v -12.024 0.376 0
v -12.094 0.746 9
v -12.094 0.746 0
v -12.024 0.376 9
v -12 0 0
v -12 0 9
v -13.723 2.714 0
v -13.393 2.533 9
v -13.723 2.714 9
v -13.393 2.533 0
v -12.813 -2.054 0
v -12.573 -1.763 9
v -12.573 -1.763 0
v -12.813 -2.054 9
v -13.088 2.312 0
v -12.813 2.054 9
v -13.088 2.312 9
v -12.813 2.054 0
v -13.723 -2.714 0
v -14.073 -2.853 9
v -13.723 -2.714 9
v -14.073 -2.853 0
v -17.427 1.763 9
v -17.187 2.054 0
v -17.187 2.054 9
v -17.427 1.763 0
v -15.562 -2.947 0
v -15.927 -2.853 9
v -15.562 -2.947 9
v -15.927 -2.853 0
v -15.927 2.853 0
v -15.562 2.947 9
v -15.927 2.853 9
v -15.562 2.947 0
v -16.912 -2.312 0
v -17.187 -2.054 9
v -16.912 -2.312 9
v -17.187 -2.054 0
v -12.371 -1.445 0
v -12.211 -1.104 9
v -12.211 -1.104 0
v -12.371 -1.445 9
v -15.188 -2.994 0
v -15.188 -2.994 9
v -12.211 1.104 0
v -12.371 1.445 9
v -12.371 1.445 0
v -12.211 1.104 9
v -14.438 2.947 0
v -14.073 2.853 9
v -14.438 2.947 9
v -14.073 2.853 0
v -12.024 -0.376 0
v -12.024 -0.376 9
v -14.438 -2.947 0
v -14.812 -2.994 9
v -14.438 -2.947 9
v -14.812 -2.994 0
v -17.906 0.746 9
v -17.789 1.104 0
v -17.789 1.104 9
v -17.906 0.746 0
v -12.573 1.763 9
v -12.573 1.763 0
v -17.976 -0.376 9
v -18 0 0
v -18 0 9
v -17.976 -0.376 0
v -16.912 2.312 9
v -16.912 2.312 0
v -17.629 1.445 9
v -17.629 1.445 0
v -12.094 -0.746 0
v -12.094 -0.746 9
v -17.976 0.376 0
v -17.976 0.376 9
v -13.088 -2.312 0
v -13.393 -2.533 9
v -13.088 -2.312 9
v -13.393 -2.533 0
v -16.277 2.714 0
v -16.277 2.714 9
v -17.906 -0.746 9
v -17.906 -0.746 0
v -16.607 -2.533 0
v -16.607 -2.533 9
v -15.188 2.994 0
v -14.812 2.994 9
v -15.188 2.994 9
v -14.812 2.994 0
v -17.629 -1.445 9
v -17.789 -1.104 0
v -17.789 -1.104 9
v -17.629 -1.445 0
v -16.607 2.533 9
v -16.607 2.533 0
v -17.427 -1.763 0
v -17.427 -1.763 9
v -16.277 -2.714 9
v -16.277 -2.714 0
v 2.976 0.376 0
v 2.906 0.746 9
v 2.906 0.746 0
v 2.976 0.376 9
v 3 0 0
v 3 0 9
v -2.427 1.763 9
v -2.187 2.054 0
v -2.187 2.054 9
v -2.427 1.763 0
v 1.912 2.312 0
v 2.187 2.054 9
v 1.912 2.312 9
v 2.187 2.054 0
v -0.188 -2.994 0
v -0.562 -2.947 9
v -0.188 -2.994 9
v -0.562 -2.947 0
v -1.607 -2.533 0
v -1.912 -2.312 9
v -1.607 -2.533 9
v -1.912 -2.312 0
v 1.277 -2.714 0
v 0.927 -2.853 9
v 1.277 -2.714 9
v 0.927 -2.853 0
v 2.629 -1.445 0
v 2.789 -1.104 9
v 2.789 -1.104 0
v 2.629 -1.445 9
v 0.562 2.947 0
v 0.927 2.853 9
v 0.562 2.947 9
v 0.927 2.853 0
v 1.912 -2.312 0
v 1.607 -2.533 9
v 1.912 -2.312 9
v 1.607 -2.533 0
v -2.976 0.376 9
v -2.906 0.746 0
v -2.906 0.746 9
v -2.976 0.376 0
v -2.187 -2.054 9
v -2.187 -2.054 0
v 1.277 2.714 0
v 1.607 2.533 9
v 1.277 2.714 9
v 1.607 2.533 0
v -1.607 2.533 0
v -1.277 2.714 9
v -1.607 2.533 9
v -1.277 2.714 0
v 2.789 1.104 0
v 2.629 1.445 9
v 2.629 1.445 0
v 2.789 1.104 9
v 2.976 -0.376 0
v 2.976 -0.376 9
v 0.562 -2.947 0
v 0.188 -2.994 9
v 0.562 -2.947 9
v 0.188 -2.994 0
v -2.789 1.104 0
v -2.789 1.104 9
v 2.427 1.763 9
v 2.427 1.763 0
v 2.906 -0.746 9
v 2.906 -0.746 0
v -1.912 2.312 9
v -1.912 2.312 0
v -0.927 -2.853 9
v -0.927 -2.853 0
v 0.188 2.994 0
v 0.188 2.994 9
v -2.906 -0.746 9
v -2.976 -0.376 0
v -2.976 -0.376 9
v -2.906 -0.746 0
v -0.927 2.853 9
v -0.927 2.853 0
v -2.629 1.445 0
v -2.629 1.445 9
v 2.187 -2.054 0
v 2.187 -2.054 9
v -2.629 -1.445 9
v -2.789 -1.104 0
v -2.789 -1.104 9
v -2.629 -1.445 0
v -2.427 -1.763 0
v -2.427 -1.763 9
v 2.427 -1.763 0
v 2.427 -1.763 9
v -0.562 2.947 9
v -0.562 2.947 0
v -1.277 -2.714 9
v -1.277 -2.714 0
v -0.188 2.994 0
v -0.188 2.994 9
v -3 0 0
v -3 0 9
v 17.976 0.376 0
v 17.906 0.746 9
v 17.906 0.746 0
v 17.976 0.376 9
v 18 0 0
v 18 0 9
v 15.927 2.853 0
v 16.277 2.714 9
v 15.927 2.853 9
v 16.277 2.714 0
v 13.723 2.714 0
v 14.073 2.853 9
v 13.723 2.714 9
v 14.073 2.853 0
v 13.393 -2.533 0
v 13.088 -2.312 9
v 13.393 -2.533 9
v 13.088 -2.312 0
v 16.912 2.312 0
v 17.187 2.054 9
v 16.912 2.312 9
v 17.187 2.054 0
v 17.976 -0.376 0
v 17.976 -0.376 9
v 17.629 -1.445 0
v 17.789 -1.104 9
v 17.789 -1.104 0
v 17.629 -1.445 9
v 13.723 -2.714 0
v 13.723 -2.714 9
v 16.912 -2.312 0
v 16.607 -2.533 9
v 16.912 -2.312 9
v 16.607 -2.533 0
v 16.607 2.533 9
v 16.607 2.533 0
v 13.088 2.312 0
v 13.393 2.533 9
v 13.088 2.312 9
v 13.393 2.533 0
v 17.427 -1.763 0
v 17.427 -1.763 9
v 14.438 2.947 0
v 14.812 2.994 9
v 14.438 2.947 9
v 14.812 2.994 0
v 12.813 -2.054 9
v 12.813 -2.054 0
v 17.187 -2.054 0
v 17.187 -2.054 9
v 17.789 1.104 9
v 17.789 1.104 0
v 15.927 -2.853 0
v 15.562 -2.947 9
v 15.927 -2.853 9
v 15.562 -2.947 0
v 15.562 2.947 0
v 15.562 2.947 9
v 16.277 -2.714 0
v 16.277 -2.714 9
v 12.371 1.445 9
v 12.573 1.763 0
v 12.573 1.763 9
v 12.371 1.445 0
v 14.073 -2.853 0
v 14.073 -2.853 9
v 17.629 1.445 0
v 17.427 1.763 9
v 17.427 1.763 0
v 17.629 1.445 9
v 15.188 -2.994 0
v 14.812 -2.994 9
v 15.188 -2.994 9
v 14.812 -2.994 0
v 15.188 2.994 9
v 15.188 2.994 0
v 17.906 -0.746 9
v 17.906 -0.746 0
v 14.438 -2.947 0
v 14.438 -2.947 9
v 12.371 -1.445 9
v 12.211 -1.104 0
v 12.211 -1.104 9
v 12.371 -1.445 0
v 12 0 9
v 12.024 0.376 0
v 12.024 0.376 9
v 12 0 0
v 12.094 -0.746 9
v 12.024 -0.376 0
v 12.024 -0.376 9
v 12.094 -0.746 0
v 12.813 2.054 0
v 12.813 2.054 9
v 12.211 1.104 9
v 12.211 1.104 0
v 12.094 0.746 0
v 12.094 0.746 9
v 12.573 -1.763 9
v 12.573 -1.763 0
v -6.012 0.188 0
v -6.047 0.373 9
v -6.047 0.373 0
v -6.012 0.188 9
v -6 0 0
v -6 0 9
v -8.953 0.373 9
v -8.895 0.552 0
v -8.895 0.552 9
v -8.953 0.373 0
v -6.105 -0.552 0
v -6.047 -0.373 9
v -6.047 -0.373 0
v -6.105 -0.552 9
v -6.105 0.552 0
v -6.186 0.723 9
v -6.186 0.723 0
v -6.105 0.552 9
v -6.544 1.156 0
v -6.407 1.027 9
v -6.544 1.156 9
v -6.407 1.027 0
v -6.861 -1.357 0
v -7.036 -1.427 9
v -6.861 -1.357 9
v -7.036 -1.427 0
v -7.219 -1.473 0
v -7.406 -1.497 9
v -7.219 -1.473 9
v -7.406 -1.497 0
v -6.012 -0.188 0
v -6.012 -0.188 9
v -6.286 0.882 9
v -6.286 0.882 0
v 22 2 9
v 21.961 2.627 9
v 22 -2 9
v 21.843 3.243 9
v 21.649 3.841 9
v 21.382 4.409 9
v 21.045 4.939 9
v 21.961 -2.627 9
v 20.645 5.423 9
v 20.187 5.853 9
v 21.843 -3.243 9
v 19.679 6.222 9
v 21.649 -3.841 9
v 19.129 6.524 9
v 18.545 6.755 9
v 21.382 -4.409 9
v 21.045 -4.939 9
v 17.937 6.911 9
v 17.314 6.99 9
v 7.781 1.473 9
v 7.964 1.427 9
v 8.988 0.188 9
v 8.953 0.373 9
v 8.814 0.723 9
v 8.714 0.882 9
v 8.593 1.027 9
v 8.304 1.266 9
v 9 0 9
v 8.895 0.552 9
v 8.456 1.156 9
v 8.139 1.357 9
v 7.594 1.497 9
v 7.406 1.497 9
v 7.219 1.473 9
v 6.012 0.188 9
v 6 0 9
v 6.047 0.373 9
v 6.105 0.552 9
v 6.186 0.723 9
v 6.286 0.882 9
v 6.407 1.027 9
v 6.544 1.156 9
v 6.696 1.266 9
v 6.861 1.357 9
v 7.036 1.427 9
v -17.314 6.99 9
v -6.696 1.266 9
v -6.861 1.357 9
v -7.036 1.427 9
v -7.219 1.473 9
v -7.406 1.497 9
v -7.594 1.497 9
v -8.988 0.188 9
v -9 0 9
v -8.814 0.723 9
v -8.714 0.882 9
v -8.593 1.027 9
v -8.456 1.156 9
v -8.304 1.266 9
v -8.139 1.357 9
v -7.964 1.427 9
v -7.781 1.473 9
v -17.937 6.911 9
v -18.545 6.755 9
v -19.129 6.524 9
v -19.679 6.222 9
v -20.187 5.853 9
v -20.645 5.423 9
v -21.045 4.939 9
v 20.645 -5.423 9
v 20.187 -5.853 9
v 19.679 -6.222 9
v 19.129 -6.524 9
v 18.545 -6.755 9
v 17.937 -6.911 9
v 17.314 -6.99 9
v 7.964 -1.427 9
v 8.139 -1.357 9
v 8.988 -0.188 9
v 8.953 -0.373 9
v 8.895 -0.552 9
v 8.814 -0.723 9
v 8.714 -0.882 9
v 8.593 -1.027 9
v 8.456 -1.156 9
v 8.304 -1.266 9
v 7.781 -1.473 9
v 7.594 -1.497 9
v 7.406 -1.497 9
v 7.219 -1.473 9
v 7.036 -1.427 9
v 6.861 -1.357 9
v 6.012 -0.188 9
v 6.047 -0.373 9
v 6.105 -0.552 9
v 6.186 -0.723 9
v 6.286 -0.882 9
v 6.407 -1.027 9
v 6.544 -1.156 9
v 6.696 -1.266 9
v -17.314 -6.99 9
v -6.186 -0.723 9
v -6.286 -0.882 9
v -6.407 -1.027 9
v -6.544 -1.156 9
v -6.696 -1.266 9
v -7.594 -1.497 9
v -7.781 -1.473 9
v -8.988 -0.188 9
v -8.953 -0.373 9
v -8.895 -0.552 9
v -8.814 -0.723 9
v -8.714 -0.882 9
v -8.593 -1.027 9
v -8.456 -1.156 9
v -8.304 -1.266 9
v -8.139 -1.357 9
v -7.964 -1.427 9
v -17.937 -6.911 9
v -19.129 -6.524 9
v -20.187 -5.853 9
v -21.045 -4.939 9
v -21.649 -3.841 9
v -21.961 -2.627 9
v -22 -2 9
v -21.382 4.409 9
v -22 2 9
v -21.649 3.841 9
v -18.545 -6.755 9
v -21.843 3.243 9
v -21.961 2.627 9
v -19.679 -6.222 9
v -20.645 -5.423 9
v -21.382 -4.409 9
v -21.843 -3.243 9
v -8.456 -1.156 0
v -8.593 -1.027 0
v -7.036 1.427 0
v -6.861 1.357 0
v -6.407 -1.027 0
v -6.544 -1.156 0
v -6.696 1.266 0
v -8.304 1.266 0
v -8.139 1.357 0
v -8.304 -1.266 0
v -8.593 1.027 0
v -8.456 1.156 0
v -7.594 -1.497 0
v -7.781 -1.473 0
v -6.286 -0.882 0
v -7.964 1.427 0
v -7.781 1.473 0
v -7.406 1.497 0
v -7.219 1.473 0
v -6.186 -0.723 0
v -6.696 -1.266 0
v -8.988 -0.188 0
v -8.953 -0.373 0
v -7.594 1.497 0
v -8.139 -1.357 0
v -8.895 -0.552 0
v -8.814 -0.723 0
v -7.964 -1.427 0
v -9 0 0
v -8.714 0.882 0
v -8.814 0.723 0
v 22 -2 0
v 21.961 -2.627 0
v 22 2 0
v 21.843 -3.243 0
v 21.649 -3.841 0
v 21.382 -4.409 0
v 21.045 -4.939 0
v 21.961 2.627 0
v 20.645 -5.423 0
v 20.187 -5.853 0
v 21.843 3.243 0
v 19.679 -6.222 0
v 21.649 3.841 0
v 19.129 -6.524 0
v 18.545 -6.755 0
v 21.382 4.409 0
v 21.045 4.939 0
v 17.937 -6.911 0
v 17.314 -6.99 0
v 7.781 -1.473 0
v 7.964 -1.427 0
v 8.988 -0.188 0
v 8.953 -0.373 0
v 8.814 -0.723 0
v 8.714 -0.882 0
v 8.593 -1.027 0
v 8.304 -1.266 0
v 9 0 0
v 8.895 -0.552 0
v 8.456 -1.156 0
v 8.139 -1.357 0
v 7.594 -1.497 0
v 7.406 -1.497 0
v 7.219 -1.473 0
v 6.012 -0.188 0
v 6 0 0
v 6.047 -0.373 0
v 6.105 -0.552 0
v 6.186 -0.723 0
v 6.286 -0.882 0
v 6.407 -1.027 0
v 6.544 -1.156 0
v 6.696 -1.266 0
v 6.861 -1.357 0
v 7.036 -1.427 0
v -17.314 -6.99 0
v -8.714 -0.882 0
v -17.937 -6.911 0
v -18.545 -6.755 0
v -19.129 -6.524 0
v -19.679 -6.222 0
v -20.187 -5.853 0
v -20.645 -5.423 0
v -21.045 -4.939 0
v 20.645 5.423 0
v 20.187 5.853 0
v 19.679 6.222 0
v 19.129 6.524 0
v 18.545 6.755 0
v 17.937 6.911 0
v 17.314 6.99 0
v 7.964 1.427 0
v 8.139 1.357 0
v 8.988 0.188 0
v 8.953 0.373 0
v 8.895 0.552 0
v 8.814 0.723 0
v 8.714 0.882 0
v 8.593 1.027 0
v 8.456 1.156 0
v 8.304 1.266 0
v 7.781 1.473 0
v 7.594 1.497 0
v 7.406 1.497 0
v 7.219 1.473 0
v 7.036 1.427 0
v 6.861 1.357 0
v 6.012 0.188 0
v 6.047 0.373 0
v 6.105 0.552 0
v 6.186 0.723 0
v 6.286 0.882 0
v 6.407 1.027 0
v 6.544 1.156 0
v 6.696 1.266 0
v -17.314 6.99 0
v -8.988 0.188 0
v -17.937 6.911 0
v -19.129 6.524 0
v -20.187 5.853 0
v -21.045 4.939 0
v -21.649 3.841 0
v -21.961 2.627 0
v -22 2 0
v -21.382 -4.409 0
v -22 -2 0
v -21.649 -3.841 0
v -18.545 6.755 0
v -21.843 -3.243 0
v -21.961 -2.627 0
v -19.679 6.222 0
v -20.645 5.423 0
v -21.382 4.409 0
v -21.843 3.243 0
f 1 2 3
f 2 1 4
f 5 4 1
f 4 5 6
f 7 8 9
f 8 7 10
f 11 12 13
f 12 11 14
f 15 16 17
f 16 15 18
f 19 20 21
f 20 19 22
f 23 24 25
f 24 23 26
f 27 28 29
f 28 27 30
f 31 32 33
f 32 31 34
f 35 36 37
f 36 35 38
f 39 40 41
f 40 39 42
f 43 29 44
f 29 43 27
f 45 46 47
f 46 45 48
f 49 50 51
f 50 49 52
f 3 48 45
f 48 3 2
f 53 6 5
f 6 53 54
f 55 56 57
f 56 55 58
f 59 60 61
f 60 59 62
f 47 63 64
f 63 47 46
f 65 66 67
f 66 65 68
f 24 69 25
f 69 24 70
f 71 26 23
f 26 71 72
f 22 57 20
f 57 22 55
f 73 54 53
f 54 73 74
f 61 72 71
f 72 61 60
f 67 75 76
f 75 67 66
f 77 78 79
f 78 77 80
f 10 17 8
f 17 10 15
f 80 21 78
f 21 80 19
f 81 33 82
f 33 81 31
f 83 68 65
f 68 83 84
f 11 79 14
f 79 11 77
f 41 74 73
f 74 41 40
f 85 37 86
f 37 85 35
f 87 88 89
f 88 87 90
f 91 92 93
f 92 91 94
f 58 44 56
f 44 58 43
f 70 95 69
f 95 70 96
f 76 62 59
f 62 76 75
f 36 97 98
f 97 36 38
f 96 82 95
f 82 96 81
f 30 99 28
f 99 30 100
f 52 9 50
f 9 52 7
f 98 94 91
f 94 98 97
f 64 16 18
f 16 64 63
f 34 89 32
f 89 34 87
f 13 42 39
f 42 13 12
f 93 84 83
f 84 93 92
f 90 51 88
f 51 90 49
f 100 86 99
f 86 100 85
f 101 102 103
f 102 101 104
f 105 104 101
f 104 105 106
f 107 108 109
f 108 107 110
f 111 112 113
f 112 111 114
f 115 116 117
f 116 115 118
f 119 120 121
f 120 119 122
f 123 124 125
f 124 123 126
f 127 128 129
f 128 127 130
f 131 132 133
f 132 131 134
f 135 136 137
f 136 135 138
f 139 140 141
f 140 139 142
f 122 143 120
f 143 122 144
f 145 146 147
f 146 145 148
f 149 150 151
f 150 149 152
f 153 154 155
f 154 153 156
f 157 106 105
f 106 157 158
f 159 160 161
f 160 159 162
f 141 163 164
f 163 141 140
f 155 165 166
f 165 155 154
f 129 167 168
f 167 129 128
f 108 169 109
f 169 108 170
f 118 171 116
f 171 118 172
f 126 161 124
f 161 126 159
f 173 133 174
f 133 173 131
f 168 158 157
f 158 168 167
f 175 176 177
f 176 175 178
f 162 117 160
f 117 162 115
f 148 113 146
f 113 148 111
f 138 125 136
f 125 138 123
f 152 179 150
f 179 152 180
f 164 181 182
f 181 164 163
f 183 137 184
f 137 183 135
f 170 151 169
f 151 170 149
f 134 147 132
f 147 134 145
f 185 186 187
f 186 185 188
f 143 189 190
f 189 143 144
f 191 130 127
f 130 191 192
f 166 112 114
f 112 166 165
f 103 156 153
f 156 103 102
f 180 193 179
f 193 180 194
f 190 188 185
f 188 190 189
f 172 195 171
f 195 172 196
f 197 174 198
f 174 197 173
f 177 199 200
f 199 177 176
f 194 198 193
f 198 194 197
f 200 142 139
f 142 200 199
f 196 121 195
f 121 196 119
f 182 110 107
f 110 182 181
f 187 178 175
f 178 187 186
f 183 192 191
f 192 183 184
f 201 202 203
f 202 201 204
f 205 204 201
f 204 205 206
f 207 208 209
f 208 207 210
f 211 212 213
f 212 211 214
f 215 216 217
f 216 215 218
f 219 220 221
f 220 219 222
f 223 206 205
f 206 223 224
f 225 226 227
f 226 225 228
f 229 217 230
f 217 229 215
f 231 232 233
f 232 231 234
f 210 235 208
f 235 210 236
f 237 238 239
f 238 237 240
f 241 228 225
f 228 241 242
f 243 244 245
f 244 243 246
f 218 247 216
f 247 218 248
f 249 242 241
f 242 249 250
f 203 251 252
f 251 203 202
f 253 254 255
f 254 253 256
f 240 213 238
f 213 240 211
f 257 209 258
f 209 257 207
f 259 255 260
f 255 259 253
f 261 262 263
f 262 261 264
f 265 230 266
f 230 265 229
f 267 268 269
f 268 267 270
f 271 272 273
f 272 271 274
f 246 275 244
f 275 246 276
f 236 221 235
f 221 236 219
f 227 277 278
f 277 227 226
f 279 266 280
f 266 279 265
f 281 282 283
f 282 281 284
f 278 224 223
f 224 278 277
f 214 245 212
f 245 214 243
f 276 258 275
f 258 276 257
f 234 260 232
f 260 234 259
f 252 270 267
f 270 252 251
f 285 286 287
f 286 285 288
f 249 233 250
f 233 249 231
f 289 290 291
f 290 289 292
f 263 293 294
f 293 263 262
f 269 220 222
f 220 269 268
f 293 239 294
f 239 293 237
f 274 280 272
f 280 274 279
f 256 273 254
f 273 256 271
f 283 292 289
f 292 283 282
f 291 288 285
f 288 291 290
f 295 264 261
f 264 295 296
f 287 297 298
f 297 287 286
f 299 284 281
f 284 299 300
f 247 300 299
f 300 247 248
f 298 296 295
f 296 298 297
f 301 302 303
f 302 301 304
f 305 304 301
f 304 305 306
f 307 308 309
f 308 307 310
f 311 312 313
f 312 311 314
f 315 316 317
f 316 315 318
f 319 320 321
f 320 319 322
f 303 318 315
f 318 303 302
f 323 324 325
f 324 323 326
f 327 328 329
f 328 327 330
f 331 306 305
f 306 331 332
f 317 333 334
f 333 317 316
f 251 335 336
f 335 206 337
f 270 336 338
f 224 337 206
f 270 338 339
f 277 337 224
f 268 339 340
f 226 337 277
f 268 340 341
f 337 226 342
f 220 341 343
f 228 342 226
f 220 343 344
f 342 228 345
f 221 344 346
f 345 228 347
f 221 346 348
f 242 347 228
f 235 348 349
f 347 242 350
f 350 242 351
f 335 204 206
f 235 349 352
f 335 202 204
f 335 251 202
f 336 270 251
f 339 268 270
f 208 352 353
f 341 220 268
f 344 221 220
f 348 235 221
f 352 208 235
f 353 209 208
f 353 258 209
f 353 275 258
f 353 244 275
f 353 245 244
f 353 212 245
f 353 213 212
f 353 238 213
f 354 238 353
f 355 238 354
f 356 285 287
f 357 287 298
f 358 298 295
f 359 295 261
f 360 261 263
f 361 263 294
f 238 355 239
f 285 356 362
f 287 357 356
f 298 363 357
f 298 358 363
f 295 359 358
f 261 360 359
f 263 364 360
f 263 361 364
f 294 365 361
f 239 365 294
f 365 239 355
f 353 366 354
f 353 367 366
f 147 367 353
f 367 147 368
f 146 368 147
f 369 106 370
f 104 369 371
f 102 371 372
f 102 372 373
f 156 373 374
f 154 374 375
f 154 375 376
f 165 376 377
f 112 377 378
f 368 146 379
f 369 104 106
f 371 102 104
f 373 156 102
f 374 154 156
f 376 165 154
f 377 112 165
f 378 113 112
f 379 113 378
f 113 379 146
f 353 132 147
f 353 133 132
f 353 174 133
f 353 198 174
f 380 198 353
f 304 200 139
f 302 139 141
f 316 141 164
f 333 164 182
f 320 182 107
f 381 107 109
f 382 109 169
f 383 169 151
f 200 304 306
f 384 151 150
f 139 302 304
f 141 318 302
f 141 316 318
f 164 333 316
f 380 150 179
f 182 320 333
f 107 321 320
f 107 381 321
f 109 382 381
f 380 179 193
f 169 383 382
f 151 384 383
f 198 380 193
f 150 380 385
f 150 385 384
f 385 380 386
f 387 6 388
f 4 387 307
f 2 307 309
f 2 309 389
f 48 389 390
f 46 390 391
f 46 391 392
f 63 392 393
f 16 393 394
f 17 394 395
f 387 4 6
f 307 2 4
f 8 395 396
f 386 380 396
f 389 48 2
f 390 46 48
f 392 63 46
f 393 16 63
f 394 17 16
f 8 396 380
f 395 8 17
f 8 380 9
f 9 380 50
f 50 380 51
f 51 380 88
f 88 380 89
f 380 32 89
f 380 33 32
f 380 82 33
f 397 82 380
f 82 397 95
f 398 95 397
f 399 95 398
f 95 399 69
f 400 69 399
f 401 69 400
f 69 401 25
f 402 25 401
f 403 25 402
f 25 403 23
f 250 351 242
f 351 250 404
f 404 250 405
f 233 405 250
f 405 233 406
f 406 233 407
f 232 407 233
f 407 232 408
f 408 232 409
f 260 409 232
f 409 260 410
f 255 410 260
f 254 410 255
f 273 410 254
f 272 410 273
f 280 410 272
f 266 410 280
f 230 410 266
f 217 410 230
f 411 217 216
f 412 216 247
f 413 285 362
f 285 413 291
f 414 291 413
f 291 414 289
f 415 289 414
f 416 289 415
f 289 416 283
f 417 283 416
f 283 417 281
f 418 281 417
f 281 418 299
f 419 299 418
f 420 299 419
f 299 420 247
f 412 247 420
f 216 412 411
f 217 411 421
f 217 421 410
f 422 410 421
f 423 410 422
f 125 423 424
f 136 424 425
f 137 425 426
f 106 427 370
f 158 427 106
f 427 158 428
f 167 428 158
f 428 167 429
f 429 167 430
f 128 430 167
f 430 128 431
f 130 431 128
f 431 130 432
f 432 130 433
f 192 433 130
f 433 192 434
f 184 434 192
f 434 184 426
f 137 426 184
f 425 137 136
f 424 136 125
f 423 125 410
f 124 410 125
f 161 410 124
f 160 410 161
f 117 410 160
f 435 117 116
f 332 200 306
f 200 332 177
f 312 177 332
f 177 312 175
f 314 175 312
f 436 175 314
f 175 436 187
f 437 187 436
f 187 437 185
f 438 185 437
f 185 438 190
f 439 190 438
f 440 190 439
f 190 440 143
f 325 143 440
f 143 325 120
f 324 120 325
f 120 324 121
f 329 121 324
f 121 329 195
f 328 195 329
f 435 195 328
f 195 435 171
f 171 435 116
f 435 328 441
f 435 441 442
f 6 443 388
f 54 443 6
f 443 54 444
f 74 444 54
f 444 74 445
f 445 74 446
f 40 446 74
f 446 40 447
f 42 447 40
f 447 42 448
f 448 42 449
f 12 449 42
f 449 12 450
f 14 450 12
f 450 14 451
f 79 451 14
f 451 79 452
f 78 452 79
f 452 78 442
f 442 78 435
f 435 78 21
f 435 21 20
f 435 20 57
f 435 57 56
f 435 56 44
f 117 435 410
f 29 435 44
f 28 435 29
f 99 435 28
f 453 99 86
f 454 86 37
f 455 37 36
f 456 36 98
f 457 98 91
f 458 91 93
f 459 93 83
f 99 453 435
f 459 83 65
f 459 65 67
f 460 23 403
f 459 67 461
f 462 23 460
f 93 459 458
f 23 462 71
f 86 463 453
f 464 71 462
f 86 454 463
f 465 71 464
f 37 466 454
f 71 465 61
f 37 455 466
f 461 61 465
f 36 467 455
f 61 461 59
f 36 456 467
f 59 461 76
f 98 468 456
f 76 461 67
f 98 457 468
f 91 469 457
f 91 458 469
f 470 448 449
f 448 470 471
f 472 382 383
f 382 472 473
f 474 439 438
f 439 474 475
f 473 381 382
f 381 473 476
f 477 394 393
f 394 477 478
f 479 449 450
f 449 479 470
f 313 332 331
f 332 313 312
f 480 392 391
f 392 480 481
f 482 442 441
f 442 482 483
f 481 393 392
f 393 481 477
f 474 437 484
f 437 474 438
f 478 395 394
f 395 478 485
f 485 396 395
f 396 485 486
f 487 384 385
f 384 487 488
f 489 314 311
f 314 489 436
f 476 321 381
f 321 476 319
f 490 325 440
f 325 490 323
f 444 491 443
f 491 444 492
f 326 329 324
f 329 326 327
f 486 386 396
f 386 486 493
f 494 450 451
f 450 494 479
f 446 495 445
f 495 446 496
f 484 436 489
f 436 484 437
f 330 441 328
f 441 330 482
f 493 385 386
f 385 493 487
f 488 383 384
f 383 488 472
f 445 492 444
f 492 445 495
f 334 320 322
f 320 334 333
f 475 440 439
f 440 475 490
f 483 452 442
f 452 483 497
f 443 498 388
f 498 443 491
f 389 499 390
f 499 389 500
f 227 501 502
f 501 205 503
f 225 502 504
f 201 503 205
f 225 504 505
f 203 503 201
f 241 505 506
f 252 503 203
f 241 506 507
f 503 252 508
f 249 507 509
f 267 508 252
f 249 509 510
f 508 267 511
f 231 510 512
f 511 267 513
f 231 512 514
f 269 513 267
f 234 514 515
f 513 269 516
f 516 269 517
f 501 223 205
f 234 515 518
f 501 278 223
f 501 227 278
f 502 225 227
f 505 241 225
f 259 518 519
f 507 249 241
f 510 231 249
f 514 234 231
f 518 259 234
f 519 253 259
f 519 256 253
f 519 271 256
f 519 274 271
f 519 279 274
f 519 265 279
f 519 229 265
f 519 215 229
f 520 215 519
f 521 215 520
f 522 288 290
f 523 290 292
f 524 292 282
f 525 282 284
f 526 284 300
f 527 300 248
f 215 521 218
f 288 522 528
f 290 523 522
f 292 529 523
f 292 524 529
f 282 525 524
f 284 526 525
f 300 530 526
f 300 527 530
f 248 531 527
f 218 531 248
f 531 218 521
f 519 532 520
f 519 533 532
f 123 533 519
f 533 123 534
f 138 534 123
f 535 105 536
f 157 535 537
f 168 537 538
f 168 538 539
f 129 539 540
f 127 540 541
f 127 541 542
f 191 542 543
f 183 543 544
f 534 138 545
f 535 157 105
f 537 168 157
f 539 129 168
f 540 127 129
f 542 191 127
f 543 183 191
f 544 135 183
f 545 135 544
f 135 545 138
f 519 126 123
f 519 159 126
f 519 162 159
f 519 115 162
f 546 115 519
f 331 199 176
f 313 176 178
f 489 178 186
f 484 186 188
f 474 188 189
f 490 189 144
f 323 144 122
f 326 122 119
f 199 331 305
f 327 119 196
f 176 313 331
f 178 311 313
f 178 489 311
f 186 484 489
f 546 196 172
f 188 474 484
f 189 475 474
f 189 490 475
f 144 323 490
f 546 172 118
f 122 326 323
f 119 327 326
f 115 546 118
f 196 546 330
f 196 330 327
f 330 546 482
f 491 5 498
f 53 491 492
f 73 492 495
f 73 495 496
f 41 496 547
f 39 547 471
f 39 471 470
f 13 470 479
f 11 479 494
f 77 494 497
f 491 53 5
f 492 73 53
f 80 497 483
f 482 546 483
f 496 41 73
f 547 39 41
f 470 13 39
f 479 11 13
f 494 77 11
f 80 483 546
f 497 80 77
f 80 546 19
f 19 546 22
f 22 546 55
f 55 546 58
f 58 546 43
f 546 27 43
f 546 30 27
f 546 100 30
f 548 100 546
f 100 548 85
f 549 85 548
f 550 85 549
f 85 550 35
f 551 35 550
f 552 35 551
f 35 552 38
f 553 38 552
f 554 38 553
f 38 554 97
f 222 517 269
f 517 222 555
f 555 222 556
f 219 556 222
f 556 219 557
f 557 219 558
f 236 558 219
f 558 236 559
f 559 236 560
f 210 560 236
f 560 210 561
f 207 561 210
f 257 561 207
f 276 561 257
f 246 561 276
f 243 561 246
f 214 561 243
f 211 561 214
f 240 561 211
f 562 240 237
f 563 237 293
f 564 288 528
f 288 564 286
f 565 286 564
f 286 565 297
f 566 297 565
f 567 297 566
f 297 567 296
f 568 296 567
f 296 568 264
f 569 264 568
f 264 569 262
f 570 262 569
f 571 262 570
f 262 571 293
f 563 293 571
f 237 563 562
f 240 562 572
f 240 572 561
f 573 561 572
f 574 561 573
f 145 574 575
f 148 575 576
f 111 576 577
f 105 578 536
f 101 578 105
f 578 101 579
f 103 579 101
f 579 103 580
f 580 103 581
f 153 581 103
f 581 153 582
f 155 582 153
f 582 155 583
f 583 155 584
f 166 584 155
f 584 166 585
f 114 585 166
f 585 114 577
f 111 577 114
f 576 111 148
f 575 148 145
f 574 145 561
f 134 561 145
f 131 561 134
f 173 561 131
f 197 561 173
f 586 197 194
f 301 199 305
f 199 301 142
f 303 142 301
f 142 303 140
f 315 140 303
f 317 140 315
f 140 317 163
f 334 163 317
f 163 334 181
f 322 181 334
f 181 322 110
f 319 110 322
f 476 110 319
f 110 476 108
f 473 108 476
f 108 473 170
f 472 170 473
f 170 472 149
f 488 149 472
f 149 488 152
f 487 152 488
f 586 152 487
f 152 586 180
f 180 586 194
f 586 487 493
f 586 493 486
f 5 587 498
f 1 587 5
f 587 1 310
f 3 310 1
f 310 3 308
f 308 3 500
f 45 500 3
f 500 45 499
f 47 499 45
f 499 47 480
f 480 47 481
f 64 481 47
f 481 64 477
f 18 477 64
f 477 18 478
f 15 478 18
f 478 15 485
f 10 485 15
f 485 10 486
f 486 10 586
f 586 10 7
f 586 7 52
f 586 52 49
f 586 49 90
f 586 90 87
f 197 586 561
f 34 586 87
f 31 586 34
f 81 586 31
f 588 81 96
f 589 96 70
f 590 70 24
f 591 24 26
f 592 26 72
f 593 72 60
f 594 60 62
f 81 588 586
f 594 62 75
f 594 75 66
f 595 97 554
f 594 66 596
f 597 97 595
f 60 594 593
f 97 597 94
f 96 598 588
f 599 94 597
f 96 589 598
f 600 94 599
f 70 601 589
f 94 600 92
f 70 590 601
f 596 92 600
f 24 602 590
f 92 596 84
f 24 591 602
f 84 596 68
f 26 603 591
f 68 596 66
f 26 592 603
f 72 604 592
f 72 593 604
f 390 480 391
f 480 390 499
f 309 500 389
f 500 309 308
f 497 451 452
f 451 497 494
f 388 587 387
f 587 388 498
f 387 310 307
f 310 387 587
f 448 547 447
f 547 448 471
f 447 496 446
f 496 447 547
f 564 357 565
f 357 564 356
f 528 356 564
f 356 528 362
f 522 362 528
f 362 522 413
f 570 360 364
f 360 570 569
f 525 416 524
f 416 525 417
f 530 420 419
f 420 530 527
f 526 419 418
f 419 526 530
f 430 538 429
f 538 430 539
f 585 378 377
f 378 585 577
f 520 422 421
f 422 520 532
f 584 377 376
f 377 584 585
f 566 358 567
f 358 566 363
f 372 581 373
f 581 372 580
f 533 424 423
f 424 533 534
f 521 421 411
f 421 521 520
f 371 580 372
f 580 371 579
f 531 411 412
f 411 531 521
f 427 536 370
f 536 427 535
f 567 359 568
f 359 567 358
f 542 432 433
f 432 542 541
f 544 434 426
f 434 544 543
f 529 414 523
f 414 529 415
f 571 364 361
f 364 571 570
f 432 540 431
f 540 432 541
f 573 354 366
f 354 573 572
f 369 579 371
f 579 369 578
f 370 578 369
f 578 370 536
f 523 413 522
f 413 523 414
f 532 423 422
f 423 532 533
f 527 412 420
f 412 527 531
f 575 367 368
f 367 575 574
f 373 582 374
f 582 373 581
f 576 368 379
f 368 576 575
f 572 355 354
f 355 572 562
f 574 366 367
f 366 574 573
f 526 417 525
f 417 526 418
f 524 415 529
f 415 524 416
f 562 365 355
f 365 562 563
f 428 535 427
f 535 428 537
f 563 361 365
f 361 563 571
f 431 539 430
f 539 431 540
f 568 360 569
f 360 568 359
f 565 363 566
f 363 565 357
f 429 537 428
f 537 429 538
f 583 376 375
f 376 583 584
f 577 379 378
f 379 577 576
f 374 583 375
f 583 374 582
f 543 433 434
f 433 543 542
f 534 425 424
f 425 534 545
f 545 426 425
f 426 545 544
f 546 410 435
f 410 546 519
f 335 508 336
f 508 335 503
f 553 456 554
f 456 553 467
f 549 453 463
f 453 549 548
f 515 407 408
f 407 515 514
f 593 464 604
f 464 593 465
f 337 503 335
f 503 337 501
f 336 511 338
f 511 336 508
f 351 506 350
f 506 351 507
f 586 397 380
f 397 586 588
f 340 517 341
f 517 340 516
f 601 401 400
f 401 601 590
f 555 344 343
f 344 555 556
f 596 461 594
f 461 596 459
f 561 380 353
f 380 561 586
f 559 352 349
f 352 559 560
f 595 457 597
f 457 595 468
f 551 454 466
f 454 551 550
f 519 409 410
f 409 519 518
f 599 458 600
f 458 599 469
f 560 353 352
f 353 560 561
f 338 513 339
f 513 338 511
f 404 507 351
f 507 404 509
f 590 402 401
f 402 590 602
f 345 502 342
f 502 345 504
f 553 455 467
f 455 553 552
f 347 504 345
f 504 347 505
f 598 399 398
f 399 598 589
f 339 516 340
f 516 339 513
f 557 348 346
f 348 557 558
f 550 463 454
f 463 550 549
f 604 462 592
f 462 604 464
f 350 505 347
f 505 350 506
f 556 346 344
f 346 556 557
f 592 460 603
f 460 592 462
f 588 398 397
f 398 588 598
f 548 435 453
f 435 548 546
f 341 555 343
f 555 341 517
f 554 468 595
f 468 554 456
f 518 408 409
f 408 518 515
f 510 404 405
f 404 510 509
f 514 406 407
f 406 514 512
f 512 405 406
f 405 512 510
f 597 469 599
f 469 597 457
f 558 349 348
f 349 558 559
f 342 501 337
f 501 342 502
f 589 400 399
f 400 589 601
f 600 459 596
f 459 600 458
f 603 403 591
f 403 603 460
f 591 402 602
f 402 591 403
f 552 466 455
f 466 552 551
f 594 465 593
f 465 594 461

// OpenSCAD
$fn = 50;


difference() {
	union() {
		hull() {
			translate(v = [-17.0000000000, 2.0000000000, 0]) {
				cylinder(h = 9, r = 5);
			}
			translate(v = [17.0000000000, 2.0000000000, 0]) {
				cylinder(h = 9, r = 5);
			}
			translate(v = [-17.0000000000, -2.0000000000, 0]) {
				cylinder(h = 9, r = 5);
			}
			translate(v = [17.0000000000, -2.0000000000, 0]) {
				cylinder(h = 9, r = 5);
			}
		}
	}
	union() {
		translate(v = [-15.0000000000, 0.0000000000, -100.0000000000]) {
			cylinder(h = 200, r = 3.0000000000);
		}
		translate(v = [0.0000000000, 0.0000000000, -100.0000000000]) {
			cylinder(h = 200, r = 3.0000000000);
		}
		translate(v = [15.0000000000, 0.0000000000, -100.0000000000]) {
			cylinder(h = 200, r = 3.0000000000);
		}
		translate(v = [-15.0000000000, 0.0000000000, 0]) {
			cylinder(h = 9, r = 1.5000000000);
		}
		translate(v = [-7.5000000000, 0.0000000000, 0]) {
			cylinder(h = 9, r = 1.5000000000);
		}
		cylinder(h = 9, r = 1.5000000000);
		translate(v = [7.5000000000, 0.0000000000, 0]) {
			cylinder(h = 9, r = 1.5000000000);
		}
		translate(v = [15.0000000000, 0.0000000000, 0]) {
			cylinder(h = 9, r = 1.5000000000);
		}
		translate(v = [-15.0000000000, 0.0000000000, 0]) {
			cylinder(h = 9, r = 1.5000000000);
		}
		translate(v = [-7.5000000000, 0.0000000000, 0]) {
			cylinder(h = 9, r = 1.5000000000);
		}
		cylinder(h = 9, r = 1.5000000000);
		translate(v = [7.5000000000, 0.0000000000, 0]) {
			cylinder(h = 9, r = 1.5000000000);
		}
		translate(v = [15.0000000000, 0.0000000000, 0]) {
			cylinder(h = 9, r = 1.5000000000);
		}
		translate(v = [-15.0000000000, 0.0000000000, 0]) {
			cylinder(h = 9, r = 1.5000000000);
		}
		translate(v = [-7.5000000000, 0.0000000000, 0]) {
			cylinder(h = 9, r = 1.5000000000);
		}
		cylinder(h = 9, r = 1.5000000000);
		translate(v = [7.5000000000, 0.0000000000, 0]) {
			cylinder(h = 9, r = 1.5000000000);
		}
		translate(v = [15.0000000000, 0.0000000000, 0]) {
			cylinder(h = 9, r = 1.5000000000);
		}
	}
}
